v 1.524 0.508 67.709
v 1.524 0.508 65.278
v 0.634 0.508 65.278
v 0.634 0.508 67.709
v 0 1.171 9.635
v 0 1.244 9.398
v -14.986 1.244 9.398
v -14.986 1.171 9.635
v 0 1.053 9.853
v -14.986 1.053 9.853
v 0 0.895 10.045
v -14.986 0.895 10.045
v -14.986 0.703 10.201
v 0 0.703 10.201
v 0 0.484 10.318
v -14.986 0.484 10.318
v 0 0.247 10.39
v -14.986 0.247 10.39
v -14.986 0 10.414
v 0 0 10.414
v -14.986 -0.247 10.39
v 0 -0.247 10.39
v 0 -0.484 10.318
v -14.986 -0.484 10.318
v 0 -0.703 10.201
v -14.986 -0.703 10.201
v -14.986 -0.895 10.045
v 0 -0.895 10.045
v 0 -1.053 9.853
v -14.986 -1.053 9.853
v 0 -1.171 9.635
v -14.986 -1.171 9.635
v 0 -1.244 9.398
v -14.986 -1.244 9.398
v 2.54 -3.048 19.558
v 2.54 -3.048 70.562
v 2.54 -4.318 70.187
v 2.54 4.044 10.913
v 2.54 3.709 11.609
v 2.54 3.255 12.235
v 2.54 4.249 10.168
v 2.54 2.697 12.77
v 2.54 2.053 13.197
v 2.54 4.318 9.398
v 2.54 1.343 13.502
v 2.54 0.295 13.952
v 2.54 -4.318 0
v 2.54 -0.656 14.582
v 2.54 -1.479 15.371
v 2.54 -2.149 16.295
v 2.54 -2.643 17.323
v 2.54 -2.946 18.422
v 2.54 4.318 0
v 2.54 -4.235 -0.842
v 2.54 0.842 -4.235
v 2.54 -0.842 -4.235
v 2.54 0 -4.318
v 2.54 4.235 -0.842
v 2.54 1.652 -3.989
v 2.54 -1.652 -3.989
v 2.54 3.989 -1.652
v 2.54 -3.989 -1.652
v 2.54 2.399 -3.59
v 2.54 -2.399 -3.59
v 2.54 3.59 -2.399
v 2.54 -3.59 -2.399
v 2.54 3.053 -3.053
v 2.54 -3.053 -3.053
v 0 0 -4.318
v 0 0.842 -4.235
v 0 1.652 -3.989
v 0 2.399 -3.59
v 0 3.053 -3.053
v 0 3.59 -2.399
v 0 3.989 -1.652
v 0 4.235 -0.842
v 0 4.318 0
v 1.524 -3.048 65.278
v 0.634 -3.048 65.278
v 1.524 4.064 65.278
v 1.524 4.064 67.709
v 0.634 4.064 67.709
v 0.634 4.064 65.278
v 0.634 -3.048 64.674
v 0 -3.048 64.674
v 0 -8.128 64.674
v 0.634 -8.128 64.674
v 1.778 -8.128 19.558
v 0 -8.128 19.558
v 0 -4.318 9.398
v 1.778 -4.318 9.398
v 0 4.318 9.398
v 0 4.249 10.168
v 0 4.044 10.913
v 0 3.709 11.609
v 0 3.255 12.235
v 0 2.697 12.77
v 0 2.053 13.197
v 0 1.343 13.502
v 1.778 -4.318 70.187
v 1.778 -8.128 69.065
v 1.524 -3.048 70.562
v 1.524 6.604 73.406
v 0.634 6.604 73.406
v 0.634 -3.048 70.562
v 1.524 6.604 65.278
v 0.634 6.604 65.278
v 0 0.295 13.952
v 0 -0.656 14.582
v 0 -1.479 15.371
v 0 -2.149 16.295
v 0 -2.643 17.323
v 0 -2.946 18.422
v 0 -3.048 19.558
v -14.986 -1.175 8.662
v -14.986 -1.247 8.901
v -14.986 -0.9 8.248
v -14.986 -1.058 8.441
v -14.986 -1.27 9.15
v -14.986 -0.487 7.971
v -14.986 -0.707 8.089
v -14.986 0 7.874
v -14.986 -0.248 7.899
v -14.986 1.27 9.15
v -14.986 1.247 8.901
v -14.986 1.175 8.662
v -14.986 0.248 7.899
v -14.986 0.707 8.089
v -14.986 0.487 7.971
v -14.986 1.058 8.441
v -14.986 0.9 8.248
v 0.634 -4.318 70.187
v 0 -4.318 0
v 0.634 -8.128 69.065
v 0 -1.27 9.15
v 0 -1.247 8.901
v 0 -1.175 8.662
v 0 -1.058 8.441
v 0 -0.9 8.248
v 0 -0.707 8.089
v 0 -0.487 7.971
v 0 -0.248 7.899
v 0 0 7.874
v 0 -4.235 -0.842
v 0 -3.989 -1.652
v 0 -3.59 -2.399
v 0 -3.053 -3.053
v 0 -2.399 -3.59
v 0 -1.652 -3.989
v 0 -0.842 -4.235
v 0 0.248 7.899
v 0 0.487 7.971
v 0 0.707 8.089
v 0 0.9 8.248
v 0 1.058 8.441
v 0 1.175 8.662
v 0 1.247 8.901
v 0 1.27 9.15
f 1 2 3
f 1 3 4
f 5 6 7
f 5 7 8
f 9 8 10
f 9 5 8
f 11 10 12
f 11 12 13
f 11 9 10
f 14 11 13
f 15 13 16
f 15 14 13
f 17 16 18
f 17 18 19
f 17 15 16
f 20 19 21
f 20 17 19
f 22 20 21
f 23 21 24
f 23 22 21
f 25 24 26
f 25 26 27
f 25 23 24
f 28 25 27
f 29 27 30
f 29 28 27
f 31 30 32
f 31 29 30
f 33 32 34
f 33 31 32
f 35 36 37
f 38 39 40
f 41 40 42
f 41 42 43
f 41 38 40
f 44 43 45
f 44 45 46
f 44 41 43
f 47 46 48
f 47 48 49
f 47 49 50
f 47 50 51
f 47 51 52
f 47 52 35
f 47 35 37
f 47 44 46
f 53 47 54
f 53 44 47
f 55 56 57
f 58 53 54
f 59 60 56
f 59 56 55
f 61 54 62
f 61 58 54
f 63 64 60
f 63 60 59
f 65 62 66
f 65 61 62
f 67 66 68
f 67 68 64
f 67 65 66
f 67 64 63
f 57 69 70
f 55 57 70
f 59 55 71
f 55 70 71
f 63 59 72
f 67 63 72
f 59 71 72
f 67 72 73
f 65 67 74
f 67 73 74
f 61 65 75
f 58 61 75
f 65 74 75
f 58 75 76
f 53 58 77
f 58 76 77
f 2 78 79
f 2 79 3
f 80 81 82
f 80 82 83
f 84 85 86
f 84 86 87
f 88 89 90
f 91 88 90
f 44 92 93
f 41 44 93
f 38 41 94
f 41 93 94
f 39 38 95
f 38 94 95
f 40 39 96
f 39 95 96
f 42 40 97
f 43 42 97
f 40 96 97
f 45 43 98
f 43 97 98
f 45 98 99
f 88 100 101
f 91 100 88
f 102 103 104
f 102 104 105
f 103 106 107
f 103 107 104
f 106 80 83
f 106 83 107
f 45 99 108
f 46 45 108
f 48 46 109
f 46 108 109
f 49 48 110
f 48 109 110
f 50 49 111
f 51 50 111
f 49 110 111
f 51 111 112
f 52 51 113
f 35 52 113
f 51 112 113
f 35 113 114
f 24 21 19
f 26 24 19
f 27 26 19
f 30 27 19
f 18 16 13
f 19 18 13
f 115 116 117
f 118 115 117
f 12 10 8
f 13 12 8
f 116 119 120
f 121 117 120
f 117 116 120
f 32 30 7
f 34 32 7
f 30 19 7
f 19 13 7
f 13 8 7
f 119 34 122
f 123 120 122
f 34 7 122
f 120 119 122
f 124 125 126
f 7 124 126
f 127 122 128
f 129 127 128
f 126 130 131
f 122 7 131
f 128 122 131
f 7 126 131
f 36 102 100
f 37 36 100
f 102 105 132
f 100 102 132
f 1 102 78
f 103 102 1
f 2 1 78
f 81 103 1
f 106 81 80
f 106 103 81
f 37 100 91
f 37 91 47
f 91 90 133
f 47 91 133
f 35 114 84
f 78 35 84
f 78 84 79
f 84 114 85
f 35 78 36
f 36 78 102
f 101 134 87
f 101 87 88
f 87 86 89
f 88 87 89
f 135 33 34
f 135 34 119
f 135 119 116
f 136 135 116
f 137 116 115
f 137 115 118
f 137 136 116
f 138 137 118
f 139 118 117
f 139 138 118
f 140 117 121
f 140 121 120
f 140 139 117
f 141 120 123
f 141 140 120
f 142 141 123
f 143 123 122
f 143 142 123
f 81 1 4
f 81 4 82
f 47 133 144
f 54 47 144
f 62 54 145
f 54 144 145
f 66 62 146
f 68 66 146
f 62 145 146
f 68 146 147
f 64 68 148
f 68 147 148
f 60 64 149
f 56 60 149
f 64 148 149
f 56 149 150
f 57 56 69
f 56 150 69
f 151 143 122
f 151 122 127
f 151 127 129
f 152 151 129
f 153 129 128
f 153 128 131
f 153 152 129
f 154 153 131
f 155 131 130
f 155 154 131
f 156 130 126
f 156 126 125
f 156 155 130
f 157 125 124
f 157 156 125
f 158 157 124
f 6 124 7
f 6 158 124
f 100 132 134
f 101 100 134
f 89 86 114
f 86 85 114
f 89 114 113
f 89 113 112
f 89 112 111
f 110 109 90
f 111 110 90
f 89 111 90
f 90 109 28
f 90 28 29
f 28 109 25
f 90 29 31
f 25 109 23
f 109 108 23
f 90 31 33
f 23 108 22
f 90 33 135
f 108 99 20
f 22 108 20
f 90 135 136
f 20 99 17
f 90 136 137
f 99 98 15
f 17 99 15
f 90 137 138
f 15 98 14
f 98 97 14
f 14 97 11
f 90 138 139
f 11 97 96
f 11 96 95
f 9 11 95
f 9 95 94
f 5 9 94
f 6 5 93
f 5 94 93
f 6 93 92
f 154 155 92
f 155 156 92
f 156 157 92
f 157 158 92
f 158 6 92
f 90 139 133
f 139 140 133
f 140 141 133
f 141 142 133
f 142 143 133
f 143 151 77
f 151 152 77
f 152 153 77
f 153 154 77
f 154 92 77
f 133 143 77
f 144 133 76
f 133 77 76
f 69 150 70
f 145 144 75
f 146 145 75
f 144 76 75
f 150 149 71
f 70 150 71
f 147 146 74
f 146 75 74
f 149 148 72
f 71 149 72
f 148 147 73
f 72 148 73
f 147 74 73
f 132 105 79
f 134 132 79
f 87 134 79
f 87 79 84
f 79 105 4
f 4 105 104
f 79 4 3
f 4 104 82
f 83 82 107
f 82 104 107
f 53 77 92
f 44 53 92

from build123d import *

# Parameters (mm, degrees)
BOSS_EXTRUDE2_DEPTH = 2.54
BOSS_EXTRUDE3_DEPTH = 1.778
BOSS_EXTRUDE4_START = 1.524
BOSS_EXTRUDE4_DEPTH = 1.27
SKETCH2_W           = 0.634140794
SKETCH2_H           = 8.731528753
CUT_EXTRUDE1_DEPTH  = 75.912777682
SKETCH1_8_R         = 1.27
BOSS_EXTRUDE5_DEPTH = 14.986


with BuildPart() as part:
    # Sketch1 → Boss-Extrude2 (new body)
    with BuildSketch(Plane(origin=(0, 0, 0), x_dir=(0, 0, -1), z_dir=(1, 0, 0))):
        with BuildLine():
            Line((0, 4.318), (-9.398, 4.318))
            ThreePointArc((-9.398, 4.318), (-11.932525974, 3.495897895), (-13.501957395, 1.342630889))
            ThreePointArc((-13.501957395, 1.342630889), (-15.817903355, -1.834857441), (-19.558, -3.048))
            Line((-19.558, -3.048), (-70.56158602, -3.048))
            Line((-70.56158602, -3.048), (-70.187321023, -4.318))
            Line((-70.187321023, -4.318), (0, -4.318))
            ThreePointArc((0, -4.318), (4.318, 0), (0, 4.318))
        make_face()
    extrude(amount=BOSS_EXTRUDE2_DEPTH)

    # Sketch1<5> → Boss-Extrude3 (add)
    with BuildSketch(Plane(origin=(0, 0, 0), x_dir=(0, 0, -1), z_dir=(1, 0, 0))):
        Polygon((-19.558, -8.128), (-9.398, -4.318), (-70.187321023, -4.318), (-69.06452603, -8.128), align=None)
    extrude(amount=BOSS_EXTRUDE3_DEPTH)

    # Sketch1<7> → Boss-Extrude4 (add)
    with BuildSketch(Plane(origin=(0, 0, 0), x_dir=(0, 0, -1), z_dir=(1, 0, 0)).offset(BOSS_EXTRUDE4_START)):
        Polygon((-70.56158602, -3.048), (-65.278, -3.048), (-65.278, 0.508), (-67.708502007, 0.508), (-67.708502007, 4.064), (-65.278, 4.064), (-65.278, 6.604), (-73.406, 6.604), align=None)
    extrude(amount=-BOSS_EXTRUDE4_DEPTH)

    # Sketch2 → Cut-Extrude1 (cut, through all)
    with BuildSketch(Plane(origin=(0, 6.604, 0), x_dir=(1, 0, 0), z_dir=(0, 1, 0))):
        with Locations((0.317070397, -69.040235623)):
            Rectangle(SKETCH2_W, SKETCH2_H)
    extrude(amount=-CUT_EXTRUDE1_DEPTH, mode=Mode.SUBTRACT)

    # Sketch1<8> → Boss-Extrude5 (add)
    with BuildSketch(Plane(origin=(0, 0, 0), x_dir=(0, 0, -1), z_dir=(1, 0, 0))):
        with Locations((-9.144, 0)):
            Circle(SKETCH1_8_R)
    extrude(amount=-BOSS_EXTRUDE5_DEPTH)


solid = part.part
